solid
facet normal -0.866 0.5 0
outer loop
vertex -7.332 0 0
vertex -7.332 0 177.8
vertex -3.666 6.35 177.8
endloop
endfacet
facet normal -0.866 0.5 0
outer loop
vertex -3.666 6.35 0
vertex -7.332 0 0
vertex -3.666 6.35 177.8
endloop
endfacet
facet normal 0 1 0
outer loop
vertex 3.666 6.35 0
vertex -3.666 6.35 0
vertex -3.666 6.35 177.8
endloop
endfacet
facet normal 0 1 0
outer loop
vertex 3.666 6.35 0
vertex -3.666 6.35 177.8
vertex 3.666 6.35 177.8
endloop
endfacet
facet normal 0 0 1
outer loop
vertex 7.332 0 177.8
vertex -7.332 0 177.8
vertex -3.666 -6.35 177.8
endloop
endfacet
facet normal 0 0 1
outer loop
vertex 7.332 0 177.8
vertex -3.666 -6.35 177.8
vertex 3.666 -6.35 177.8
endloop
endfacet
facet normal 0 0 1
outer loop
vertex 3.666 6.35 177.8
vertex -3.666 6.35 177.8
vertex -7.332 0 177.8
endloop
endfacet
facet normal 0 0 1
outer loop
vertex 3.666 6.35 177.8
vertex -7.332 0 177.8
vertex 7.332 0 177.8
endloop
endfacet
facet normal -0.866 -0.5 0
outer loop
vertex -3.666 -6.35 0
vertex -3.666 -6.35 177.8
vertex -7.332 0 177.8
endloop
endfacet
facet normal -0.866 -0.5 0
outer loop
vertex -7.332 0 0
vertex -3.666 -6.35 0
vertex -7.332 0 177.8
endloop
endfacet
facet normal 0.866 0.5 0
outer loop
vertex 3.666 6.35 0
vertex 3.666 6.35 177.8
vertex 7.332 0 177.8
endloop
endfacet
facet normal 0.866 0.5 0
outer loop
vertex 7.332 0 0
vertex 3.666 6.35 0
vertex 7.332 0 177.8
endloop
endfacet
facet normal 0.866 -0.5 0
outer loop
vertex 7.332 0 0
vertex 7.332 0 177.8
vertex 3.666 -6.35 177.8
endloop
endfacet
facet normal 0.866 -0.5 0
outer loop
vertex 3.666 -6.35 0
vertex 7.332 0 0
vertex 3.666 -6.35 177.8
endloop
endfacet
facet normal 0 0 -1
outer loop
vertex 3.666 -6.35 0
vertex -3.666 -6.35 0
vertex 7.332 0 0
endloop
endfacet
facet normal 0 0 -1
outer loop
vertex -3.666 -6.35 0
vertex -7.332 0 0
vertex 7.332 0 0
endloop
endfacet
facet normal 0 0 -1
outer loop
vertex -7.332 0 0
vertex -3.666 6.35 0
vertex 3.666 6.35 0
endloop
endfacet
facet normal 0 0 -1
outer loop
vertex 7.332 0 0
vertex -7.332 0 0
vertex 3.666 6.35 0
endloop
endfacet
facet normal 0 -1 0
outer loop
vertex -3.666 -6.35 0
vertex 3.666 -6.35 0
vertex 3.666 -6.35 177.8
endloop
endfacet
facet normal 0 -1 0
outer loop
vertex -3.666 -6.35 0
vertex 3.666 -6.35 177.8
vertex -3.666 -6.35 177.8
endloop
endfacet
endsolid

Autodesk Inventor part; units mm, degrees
ref_plane "YZ Plane" through (0, 0, 0) normal (1, 0, 0) x (0, 1, 0)
ref_plane "XZ Plane" through (0, 0, 0) normal (0, 1, 0) x (-1, 0, 0)
ref_plane "XY Plane" through (0, 0, 0) normal (0, 0, 1) x (1, 0, 0)
sketch "Sketch1" plane through (0, 0, 0) normal (0, 0, 1) x (1, 0, 0)
  line L0 (3.6662, 6.35) -> (7.3323, 0)
  line L1 (7.3323, 0) -> (3.6662, -6.35)
  line L2 (3.6662, -6.35) -> (-3.6662, -6.35)
  line L3 (-3.6662, -6.35) -> (-7.3323, 0)
  line L4 (-7.3323, 0) -> (-3.6662, 6.35)
  line L5 (-3.6662, 6.35) -> (3.6662, 6.35)
  point P0 (0, 0)
  point P1 (0, 0)
  dimension "d0" = 12.7
extrude "Extrusion1" add sketch "Sketch1" along normal blind 177.8
properties part number "hex rod 7 inch" material "Steel, Alloy"
